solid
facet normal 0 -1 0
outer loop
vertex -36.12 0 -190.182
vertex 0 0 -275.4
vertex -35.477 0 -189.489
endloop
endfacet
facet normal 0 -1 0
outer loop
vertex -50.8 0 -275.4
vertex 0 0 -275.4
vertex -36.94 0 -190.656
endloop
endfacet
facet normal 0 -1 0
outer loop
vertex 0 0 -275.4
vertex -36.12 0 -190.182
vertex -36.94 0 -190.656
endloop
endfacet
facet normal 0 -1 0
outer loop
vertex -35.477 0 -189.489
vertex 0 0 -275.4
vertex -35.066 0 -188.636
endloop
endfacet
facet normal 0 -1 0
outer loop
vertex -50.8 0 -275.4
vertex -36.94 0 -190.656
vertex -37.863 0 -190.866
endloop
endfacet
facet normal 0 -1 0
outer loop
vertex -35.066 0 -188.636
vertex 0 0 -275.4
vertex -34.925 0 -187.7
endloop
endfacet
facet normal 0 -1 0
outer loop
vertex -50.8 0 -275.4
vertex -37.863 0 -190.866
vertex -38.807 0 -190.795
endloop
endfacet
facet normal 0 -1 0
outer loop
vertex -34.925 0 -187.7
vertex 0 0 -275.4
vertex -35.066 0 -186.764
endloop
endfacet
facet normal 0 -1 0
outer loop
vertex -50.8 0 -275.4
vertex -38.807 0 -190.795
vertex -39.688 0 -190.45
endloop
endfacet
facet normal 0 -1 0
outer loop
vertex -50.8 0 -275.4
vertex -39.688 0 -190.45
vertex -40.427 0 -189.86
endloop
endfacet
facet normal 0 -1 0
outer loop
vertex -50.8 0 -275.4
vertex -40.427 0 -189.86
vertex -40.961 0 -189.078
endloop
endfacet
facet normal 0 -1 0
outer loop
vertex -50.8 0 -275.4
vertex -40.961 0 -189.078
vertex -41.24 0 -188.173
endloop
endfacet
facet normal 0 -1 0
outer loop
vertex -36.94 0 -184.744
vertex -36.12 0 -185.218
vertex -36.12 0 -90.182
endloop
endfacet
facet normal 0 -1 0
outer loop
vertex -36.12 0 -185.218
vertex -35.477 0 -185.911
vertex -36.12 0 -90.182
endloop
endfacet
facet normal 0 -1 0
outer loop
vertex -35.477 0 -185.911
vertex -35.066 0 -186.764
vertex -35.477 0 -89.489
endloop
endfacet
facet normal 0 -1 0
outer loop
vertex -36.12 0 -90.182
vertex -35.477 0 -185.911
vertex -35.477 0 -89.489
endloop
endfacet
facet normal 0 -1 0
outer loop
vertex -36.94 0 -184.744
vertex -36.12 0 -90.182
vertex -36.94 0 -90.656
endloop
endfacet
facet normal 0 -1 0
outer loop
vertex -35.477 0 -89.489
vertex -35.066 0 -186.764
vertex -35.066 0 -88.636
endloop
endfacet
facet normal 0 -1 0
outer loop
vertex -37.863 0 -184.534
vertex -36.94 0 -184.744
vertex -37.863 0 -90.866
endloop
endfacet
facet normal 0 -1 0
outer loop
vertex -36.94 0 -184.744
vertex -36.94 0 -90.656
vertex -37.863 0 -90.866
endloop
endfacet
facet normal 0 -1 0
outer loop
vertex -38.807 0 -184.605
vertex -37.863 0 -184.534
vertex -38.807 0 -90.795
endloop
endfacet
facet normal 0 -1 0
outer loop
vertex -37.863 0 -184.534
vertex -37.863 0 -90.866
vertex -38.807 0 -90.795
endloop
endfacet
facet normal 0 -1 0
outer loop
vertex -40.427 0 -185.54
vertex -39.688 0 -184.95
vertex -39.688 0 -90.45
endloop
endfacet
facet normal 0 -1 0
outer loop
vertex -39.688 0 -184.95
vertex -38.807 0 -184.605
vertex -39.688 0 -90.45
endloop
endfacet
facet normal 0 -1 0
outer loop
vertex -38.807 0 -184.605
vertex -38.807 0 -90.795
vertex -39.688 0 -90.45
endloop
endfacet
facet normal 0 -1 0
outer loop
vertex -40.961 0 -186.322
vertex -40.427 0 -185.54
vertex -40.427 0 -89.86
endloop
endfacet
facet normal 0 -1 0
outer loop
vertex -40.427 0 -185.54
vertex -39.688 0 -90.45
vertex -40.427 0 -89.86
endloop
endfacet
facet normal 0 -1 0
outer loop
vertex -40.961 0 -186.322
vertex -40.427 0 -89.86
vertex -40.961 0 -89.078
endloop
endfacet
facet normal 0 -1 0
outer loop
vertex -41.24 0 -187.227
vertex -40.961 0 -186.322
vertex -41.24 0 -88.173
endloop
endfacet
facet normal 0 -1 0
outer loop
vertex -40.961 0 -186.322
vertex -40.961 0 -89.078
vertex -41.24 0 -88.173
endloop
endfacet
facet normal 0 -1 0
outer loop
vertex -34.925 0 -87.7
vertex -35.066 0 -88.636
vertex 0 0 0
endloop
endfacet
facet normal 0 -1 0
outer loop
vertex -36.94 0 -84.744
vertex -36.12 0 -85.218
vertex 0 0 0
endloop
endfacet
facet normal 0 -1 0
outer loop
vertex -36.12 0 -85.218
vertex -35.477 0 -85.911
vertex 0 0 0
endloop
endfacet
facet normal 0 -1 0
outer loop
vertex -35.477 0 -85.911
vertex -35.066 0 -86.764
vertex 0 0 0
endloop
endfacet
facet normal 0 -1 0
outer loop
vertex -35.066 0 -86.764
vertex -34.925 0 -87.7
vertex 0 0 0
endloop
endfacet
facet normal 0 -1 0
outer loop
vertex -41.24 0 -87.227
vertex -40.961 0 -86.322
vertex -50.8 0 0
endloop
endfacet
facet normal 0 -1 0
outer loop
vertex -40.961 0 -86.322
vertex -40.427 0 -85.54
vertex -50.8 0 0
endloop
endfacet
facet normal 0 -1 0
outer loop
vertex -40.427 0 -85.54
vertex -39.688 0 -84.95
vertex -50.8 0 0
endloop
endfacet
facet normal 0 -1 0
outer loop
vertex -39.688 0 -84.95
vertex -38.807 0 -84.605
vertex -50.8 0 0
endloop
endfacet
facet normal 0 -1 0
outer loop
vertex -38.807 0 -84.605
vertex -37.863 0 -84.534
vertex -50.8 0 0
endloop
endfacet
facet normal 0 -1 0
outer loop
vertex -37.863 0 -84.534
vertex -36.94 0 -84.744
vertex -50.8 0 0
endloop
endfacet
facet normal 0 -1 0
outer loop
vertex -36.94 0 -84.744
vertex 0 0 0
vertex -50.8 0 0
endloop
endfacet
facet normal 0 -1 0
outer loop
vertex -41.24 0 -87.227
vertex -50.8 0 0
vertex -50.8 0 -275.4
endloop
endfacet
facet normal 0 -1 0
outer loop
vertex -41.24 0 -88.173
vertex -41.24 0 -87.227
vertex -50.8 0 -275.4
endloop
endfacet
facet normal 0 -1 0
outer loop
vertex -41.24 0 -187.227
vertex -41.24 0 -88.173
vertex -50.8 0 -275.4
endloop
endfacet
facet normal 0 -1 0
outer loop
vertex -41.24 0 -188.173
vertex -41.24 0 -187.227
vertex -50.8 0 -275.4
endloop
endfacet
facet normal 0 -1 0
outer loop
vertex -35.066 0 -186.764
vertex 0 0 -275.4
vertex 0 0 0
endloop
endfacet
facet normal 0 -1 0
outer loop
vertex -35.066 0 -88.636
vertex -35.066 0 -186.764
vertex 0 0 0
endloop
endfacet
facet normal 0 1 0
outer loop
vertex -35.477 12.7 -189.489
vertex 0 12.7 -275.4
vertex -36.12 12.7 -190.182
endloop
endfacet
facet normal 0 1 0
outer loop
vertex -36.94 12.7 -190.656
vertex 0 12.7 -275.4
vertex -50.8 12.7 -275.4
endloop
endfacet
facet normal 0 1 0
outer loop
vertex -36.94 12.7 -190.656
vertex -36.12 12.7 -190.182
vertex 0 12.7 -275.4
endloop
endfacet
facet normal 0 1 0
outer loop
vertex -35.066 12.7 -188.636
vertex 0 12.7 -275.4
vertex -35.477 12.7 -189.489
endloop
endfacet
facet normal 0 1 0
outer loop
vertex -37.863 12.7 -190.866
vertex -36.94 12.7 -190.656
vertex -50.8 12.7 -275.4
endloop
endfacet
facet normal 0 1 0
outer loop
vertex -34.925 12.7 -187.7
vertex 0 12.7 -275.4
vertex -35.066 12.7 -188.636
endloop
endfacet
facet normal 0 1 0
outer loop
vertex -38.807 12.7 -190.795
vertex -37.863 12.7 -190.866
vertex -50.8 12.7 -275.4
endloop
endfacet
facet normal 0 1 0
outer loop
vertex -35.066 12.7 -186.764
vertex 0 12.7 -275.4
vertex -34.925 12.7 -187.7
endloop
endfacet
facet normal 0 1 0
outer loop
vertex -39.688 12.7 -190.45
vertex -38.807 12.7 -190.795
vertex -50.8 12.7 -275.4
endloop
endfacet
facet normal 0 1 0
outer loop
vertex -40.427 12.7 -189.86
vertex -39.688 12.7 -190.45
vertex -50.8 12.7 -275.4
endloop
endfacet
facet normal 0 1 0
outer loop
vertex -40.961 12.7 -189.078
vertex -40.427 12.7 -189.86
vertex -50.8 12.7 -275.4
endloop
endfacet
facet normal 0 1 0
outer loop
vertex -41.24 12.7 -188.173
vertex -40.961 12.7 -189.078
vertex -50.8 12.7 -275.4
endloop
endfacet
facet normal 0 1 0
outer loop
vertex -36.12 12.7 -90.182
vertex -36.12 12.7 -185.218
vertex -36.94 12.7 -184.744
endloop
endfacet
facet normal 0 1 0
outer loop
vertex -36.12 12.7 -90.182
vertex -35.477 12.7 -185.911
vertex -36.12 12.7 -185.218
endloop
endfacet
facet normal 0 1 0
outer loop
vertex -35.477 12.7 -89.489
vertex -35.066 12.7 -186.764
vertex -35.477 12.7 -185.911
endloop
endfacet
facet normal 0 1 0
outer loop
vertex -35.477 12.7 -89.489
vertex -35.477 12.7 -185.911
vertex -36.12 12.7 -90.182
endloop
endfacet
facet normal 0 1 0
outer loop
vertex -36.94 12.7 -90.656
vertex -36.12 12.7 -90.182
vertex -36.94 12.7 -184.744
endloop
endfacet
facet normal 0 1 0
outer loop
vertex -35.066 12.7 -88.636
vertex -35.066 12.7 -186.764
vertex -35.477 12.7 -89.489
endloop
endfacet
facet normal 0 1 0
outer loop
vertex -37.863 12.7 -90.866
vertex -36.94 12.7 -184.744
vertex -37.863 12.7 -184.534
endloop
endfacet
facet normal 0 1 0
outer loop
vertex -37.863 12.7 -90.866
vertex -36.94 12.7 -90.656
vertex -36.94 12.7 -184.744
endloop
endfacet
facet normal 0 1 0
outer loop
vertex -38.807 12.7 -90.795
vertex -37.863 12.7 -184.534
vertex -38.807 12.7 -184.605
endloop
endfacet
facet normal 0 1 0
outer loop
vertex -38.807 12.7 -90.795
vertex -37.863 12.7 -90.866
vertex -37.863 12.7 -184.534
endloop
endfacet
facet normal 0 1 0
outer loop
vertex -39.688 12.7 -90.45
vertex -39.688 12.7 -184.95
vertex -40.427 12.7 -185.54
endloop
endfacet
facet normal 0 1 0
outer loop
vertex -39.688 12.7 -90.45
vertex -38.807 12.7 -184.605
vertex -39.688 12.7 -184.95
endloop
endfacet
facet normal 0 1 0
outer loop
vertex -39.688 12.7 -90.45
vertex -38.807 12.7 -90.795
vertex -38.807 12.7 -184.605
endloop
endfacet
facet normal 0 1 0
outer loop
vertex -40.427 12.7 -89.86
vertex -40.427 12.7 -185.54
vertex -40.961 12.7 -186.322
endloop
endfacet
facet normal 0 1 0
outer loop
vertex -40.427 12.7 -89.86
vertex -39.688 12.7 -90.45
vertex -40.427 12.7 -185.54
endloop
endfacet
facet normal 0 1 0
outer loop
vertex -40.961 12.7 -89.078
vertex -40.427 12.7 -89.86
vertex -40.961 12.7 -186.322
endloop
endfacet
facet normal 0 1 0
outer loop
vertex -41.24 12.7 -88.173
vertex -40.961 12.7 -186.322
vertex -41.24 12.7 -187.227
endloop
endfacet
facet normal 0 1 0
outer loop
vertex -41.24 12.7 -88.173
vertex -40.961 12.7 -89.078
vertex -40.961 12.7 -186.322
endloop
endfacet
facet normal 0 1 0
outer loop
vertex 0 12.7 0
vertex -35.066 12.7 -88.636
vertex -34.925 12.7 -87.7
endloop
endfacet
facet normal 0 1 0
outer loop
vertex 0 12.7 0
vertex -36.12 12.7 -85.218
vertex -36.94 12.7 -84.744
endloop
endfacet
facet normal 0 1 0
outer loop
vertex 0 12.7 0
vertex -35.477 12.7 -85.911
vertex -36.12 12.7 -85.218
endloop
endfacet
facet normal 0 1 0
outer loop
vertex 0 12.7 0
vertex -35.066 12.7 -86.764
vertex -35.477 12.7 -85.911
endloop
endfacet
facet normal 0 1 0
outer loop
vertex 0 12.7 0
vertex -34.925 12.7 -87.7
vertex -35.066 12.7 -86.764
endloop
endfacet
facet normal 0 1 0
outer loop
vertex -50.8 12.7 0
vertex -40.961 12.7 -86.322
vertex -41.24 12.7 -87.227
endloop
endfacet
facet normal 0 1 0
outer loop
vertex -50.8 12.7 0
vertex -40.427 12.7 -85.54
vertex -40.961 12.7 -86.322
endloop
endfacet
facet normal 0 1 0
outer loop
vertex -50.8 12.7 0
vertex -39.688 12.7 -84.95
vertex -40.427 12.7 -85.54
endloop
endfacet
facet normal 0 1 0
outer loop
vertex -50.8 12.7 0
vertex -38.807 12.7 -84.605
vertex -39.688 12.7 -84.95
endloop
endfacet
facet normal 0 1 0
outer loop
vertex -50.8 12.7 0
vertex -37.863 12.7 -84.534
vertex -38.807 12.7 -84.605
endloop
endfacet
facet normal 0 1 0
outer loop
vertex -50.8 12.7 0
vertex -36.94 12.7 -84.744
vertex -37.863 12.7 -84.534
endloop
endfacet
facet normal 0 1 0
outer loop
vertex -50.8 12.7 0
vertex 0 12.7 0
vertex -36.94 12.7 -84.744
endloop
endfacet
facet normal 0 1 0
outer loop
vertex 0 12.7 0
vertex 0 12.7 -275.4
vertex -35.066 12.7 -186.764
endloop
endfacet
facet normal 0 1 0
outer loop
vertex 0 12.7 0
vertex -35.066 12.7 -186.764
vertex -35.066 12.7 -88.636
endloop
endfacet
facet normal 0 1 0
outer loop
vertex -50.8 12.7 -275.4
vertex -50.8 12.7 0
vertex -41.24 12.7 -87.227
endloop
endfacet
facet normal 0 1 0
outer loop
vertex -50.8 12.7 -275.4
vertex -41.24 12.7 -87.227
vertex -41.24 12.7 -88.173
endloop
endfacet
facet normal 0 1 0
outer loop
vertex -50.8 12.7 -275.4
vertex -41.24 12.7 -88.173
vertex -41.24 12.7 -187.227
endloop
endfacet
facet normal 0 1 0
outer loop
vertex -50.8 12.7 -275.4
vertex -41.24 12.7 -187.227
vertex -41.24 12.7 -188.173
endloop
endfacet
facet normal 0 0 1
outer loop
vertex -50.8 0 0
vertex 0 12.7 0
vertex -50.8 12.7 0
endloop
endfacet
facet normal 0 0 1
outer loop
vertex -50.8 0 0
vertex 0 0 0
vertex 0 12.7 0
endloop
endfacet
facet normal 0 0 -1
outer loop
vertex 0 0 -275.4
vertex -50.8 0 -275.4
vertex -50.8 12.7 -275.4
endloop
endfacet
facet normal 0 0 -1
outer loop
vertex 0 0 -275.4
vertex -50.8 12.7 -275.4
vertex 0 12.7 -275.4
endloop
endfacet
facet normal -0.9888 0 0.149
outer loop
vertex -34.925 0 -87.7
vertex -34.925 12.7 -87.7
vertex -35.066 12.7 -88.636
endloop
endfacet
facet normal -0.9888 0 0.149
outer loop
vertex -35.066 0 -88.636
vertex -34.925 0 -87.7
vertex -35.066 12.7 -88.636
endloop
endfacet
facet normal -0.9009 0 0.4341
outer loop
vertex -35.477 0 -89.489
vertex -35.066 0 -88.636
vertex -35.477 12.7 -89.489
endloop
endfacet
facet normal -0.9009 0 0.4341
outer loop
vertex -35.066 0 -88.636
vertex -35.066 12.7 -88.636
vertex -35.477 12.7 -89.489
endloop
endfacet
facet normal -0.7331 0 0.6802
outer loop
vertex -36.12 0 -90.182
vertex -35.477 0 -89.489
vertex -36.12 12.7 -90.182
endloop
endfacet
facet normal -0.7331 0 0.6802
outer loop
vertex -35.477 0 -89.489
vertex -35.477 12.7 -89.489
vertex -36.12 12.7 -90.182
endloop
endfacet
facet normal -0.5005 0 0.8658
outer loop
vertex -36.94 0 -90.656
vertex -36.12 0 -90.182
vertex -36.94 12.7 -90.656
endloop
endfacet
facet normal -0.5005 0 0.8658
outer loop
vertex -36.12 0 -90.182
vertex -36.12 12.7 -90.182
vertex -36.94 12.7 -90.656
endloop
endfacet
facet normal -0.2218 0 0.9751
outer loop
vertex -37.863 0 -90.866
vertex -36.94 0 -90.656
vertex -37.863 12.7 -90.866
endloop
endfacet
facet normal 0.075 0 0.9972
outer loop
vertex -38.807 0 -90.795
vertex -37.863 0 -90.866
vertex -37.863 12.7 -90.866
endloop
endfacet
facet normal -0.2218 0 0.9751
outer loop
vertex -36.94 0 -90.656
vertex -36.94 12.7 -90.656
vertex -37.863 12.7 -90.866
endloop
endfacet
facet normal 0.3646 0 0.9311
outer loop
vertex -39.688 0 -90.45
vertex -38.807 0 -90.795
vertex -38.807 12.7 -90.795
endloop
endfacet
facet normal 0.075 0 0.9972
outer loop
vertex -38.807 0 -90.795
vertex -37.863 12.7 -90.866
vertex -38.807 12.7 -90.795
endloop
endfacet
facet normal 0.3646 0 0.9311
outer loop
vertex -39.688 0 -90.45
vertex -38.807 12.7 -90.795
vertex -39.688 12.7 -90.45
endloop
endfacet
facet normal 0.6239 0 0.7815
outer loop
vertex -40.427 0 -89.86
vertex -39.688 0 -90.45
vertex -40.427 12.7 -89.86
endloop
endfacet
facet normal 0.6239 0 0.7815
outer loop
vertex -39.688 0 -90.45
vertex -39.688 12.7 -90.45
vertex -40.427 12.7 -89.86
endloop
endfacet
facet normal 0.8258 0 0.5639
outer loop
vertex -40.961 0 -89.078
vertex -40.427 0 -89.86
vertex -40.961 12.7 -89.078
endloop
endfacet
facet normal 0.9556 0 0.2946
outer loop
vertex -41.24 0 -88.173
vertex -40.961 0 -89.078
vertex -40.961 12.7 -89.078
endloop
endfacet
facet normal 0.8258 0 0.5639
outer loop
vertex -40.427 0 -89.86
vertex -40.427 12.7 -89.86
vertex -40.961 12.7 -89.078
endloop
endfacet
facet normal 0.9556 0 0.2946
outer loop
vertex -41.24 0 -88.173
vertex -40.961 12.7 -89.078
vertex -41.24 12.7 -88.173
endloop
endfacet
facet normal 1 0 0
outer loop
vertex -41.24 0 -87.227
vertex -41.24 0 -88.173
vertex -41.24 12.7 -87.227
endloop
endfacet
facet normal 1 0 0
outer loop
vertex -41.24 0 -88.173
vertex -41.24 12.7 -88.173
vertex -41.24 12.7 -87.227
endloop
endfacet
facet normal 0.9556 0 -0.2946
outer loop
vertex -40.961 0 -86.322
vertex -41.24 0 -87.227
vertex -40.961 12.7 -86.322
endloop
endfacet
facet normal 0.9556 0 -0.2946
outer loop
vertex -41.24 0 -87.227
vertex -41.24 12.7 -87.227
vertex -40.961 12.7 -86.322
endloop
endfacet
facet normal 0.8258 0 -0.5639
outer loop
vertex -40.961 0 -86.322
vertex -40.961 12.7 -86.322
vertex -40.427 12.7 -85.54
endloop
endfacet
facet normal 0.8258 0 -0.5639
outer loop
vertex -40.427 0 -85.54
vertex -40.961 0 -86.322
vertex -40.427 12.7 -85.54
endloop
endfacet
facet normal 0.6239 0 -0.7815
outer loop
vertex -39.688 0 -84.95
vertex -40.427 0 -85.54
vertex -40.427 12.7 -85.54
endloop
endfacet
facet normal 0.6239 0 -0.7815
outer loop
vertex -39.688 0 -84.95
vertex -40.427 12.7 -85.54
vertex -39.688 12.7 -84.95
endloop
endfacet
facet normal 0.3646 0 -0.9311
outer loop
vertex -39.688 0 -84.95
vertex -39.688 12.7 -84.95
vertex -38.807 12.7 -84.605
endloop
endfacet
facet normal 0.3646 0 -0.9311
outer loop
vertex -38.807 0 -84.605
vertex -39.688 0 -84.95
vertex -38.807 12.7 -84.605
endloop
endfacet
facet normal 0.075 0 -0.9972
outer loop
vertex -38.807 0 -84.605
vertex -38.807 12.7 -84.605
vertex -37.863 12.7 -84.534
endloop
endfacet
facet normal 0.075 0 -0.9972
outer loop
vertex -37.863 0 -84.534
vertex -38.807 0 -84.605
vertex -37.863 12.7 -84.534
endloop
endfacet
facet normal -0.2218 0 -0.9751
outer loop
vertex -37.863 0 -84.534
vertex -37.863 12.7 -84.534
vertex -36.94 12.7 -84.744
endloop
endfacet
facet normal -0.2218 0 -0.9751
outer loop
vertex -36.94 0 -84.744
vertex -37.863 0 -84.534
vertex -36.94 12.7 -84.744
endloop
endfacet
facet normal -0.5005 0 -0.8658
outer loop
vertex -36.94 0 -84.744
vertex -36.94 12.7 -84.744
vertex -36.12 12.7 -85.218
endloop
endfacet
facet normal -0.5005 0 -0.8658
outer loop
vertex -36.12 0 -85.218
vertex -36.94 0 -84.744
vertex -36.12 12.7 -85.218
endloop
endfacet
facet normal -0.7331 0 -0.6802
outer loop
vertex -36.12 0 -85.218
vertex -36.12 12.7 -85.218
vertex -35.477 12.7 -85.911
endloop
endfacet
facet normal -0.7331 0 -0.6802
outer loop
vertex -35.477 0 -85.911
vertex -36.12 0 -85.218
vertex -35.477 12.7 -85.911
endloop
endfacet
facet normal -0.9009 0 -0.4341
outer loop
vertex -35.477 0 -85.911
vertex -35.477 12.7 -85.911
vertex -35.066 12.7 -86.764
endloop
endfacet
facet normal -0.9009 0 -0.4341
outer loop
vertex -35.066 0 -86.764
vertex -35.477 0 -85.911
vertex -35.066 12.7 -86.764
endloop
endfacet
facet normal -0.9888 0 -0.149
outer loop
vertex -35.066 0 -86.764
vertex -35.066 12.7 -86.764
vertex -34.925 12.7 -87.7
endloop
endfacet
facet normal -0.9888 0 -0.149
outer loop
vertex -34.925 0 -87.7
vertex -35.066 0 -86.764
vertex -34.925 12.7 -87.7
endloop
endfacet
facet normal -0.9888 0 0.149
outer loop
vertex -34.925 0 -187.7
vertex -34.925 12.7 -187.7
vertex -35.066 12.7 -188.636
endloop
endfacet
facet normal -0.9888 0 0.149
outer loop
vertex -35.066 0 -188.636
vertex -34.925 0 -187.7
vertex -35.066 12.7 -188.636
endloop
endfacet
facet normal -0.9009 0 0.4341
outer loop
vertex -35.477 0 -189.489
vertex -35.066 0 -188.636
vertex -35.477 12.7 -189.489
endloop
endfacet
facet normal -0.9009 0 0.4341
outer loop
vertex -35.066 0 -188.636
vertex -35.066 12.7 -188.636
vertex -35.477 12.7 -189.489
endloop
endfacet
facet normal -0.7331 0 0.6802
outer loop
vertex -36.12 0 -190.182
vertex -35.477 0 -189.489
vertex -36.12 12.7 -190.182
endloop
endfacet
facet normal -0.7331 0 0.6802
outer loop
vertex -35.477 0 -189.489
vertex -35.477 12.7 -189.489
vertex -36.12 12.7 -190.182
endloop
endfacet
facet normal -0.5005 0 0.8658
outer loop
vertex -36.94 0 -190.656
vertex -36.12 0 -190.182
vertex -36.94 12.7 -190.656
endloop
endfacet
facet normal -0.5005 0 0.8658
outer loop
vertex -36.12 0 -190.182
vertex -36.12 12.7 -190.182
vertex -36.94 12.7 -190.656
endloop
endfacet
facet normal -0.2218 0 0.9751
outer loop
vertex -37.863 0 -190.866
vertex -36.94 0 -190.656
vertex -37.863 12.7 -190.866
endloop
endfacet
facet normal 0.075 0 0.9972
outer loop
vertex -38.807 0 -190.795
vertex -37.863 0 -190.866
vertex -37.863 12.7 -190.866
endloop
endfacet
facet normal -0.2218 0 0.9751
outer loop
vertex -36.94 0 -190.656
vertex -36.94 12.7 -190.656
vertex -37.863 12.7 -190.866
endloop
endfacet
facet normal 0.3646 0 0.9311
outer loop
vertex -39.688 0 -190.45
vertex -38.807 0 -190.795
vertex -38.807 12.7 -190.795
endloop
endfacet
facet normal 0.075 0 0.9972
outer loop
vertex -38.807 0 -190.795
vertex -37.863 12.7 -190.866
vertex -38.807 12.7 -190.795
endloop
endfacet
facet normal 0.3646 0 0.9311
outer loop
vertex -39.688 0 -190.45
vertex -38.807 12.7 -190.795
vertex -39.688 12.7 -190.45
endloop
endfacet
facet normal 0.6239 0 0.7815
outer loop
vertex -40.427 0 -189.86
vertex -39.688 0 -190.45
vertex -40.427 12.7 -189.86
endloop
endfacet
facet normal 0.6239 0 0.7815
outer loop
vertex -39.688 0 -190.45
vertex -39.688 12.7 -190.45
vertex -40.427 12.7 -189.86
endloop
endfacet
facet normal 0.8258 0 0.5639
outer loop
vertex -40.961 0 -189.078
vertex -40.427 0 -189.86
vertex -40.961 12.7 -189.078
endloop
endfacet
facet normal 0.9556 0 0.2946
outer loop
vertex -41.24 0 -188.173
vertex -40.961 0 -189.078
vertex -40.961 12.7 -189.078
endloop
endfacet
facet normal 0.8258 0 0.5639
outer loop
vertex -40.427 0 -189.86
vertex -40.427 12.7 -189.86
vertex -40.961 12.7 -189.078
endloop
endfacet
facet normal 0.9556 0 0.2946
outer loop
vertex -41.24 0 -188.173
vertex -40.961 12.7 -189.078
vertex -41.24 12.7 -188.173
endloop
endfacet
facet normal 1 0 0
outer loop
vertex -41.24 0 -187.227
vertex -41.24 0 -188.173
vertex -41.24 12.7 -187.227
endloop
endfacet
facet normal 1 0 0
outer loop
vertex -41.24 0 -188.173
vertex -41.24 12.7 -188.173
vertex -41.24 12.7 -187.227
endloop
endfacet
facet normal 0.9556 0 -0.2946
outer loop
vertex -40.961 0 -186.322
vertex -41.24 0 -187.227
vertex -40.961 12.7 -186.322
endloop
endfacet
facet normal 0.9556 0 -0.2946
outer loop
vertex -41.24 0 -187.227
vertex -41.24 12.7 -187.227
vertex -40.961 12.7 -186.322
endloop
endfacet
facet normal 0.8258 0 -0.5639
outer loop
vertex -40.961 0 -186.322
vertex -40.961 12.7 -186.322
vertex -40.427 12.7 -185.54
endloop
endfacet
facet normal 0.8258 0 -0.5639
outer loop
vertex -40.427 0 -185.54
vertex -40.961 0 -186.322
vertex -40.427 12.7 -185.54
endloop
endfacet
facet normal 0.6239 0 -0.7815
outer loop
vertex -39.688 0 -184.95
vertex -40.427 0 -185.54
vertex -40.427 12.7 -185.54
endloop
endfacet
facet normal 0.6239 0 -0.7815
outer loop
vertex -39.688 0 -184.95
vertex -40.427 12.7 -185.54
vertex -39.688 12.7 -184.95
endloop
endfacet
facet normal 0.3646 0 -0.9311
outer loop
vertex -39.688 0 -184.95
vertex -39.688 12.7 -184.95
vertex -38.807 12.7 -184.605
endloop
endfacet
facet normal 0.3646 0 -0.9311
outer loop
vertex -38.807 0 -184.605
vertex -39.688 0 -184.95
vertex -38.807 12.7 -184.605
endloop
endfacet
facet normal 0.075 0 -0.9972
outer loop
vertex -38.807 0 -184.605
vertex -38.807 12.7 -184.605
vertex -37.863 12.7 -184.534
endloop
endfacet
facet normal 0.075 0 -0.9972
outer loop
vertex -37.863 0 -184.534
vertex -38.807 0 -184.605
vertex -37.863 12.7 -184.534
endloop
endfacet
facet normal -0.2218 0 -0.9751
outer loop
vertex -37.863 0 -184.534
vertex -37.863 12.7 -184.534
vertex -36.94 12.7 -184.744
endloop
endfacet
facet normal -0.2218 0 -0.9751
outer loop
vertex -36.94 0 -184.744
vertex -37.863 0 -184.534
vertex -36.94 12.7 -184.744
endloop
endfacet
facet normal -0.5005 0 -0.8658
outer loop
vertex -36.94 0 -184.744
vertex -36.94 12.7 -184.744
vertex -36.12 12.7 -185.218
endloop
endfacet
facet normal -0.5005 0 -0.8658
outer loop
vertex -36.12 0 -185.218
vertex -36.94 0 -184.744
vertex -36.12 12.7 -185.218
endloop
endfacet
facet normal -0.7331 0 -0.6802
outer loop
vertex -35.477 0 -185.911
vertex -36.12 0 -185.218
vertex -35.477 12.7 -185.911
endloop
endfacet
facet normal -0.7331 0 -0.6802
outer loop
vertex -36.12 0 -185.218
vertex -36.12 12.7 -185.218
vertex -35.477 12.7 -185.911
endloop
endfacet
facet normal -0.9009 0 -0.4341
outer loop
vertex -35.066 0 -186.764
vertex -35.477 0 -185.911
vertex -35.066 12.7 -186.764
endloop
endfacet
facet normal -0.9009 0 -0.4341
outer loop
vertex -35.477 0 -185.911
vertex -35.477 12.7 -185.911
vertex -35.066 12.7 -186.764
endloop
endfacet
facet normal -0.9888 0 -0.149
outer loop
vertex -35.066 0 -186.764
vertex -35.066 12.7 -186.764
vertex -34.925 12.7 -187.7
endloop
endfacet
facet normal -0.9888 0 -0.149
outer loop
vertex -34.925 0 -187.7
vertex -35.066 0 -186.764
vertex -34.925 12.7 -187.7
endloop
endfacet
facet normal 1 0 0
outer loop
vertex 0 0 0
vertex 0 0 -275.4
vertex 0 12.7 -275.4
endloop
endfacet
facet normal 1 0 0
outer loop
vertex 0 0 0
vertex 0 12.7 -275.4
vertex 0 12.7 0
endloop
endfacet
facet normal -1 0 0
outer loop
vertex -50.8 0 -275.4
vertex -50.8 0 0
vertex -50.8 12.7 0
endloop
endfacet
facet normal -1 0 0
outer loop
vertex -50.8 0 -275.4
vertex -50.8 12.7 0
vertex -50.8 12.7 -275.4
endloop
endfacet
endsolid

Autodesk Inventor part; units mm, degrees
ref_plane "YZ Plane" through (0, 0, 0) normal (1, 0, 0) x (0, 1, 0)
ref_plane "XZ Plane" through (0, 0, 0) normal (0, 1, 0) x (-1, 0, 0)
ref_plane "XY Plane" through (0, 0, 0) normal (0, 0, 1) x (1, 0, 0)
sketch "Sketch1" plane through (0, 0, 0) normal (0, 1, 0) x (-1, 0, 0)
  line L0 (0, 0) -> (50.8, 0)
  line L1 (50.8, 0) -> (50.8, -275.4)
  line L2 (50.8, -275.4) -> (0, -275.4)
  line L3 (0, -275.4) -> (0, 0)
  dimension "d0" = 50.8
  dimension "d1" = 275.4
extrude "Extrusion1" add sketch "Sketch1" along normal blind 12.7
sketch "Sketch2" plane through (0, 12.7, 0) normal (0, 1, 0) x (1, 0, 0)
  circle A0 centre (-38.1, 87.7) radius 3.175
  circle A1 centre (-38.1, 187.7) radius 3.175
  line L0 (-50.8, 0) -> (0, 0) projected
  line L1 (0, 0) -> (0, 275.4) projected
  dimension "d4" = 87.7
  dimension "d5" = 100
  dimension "d6" = 6.35
  dimension "d7" = 38.1
extrude "Extrusion2" cut sketch "Sketch2" against normal blind 12.7
properties part number "Wood-8"
